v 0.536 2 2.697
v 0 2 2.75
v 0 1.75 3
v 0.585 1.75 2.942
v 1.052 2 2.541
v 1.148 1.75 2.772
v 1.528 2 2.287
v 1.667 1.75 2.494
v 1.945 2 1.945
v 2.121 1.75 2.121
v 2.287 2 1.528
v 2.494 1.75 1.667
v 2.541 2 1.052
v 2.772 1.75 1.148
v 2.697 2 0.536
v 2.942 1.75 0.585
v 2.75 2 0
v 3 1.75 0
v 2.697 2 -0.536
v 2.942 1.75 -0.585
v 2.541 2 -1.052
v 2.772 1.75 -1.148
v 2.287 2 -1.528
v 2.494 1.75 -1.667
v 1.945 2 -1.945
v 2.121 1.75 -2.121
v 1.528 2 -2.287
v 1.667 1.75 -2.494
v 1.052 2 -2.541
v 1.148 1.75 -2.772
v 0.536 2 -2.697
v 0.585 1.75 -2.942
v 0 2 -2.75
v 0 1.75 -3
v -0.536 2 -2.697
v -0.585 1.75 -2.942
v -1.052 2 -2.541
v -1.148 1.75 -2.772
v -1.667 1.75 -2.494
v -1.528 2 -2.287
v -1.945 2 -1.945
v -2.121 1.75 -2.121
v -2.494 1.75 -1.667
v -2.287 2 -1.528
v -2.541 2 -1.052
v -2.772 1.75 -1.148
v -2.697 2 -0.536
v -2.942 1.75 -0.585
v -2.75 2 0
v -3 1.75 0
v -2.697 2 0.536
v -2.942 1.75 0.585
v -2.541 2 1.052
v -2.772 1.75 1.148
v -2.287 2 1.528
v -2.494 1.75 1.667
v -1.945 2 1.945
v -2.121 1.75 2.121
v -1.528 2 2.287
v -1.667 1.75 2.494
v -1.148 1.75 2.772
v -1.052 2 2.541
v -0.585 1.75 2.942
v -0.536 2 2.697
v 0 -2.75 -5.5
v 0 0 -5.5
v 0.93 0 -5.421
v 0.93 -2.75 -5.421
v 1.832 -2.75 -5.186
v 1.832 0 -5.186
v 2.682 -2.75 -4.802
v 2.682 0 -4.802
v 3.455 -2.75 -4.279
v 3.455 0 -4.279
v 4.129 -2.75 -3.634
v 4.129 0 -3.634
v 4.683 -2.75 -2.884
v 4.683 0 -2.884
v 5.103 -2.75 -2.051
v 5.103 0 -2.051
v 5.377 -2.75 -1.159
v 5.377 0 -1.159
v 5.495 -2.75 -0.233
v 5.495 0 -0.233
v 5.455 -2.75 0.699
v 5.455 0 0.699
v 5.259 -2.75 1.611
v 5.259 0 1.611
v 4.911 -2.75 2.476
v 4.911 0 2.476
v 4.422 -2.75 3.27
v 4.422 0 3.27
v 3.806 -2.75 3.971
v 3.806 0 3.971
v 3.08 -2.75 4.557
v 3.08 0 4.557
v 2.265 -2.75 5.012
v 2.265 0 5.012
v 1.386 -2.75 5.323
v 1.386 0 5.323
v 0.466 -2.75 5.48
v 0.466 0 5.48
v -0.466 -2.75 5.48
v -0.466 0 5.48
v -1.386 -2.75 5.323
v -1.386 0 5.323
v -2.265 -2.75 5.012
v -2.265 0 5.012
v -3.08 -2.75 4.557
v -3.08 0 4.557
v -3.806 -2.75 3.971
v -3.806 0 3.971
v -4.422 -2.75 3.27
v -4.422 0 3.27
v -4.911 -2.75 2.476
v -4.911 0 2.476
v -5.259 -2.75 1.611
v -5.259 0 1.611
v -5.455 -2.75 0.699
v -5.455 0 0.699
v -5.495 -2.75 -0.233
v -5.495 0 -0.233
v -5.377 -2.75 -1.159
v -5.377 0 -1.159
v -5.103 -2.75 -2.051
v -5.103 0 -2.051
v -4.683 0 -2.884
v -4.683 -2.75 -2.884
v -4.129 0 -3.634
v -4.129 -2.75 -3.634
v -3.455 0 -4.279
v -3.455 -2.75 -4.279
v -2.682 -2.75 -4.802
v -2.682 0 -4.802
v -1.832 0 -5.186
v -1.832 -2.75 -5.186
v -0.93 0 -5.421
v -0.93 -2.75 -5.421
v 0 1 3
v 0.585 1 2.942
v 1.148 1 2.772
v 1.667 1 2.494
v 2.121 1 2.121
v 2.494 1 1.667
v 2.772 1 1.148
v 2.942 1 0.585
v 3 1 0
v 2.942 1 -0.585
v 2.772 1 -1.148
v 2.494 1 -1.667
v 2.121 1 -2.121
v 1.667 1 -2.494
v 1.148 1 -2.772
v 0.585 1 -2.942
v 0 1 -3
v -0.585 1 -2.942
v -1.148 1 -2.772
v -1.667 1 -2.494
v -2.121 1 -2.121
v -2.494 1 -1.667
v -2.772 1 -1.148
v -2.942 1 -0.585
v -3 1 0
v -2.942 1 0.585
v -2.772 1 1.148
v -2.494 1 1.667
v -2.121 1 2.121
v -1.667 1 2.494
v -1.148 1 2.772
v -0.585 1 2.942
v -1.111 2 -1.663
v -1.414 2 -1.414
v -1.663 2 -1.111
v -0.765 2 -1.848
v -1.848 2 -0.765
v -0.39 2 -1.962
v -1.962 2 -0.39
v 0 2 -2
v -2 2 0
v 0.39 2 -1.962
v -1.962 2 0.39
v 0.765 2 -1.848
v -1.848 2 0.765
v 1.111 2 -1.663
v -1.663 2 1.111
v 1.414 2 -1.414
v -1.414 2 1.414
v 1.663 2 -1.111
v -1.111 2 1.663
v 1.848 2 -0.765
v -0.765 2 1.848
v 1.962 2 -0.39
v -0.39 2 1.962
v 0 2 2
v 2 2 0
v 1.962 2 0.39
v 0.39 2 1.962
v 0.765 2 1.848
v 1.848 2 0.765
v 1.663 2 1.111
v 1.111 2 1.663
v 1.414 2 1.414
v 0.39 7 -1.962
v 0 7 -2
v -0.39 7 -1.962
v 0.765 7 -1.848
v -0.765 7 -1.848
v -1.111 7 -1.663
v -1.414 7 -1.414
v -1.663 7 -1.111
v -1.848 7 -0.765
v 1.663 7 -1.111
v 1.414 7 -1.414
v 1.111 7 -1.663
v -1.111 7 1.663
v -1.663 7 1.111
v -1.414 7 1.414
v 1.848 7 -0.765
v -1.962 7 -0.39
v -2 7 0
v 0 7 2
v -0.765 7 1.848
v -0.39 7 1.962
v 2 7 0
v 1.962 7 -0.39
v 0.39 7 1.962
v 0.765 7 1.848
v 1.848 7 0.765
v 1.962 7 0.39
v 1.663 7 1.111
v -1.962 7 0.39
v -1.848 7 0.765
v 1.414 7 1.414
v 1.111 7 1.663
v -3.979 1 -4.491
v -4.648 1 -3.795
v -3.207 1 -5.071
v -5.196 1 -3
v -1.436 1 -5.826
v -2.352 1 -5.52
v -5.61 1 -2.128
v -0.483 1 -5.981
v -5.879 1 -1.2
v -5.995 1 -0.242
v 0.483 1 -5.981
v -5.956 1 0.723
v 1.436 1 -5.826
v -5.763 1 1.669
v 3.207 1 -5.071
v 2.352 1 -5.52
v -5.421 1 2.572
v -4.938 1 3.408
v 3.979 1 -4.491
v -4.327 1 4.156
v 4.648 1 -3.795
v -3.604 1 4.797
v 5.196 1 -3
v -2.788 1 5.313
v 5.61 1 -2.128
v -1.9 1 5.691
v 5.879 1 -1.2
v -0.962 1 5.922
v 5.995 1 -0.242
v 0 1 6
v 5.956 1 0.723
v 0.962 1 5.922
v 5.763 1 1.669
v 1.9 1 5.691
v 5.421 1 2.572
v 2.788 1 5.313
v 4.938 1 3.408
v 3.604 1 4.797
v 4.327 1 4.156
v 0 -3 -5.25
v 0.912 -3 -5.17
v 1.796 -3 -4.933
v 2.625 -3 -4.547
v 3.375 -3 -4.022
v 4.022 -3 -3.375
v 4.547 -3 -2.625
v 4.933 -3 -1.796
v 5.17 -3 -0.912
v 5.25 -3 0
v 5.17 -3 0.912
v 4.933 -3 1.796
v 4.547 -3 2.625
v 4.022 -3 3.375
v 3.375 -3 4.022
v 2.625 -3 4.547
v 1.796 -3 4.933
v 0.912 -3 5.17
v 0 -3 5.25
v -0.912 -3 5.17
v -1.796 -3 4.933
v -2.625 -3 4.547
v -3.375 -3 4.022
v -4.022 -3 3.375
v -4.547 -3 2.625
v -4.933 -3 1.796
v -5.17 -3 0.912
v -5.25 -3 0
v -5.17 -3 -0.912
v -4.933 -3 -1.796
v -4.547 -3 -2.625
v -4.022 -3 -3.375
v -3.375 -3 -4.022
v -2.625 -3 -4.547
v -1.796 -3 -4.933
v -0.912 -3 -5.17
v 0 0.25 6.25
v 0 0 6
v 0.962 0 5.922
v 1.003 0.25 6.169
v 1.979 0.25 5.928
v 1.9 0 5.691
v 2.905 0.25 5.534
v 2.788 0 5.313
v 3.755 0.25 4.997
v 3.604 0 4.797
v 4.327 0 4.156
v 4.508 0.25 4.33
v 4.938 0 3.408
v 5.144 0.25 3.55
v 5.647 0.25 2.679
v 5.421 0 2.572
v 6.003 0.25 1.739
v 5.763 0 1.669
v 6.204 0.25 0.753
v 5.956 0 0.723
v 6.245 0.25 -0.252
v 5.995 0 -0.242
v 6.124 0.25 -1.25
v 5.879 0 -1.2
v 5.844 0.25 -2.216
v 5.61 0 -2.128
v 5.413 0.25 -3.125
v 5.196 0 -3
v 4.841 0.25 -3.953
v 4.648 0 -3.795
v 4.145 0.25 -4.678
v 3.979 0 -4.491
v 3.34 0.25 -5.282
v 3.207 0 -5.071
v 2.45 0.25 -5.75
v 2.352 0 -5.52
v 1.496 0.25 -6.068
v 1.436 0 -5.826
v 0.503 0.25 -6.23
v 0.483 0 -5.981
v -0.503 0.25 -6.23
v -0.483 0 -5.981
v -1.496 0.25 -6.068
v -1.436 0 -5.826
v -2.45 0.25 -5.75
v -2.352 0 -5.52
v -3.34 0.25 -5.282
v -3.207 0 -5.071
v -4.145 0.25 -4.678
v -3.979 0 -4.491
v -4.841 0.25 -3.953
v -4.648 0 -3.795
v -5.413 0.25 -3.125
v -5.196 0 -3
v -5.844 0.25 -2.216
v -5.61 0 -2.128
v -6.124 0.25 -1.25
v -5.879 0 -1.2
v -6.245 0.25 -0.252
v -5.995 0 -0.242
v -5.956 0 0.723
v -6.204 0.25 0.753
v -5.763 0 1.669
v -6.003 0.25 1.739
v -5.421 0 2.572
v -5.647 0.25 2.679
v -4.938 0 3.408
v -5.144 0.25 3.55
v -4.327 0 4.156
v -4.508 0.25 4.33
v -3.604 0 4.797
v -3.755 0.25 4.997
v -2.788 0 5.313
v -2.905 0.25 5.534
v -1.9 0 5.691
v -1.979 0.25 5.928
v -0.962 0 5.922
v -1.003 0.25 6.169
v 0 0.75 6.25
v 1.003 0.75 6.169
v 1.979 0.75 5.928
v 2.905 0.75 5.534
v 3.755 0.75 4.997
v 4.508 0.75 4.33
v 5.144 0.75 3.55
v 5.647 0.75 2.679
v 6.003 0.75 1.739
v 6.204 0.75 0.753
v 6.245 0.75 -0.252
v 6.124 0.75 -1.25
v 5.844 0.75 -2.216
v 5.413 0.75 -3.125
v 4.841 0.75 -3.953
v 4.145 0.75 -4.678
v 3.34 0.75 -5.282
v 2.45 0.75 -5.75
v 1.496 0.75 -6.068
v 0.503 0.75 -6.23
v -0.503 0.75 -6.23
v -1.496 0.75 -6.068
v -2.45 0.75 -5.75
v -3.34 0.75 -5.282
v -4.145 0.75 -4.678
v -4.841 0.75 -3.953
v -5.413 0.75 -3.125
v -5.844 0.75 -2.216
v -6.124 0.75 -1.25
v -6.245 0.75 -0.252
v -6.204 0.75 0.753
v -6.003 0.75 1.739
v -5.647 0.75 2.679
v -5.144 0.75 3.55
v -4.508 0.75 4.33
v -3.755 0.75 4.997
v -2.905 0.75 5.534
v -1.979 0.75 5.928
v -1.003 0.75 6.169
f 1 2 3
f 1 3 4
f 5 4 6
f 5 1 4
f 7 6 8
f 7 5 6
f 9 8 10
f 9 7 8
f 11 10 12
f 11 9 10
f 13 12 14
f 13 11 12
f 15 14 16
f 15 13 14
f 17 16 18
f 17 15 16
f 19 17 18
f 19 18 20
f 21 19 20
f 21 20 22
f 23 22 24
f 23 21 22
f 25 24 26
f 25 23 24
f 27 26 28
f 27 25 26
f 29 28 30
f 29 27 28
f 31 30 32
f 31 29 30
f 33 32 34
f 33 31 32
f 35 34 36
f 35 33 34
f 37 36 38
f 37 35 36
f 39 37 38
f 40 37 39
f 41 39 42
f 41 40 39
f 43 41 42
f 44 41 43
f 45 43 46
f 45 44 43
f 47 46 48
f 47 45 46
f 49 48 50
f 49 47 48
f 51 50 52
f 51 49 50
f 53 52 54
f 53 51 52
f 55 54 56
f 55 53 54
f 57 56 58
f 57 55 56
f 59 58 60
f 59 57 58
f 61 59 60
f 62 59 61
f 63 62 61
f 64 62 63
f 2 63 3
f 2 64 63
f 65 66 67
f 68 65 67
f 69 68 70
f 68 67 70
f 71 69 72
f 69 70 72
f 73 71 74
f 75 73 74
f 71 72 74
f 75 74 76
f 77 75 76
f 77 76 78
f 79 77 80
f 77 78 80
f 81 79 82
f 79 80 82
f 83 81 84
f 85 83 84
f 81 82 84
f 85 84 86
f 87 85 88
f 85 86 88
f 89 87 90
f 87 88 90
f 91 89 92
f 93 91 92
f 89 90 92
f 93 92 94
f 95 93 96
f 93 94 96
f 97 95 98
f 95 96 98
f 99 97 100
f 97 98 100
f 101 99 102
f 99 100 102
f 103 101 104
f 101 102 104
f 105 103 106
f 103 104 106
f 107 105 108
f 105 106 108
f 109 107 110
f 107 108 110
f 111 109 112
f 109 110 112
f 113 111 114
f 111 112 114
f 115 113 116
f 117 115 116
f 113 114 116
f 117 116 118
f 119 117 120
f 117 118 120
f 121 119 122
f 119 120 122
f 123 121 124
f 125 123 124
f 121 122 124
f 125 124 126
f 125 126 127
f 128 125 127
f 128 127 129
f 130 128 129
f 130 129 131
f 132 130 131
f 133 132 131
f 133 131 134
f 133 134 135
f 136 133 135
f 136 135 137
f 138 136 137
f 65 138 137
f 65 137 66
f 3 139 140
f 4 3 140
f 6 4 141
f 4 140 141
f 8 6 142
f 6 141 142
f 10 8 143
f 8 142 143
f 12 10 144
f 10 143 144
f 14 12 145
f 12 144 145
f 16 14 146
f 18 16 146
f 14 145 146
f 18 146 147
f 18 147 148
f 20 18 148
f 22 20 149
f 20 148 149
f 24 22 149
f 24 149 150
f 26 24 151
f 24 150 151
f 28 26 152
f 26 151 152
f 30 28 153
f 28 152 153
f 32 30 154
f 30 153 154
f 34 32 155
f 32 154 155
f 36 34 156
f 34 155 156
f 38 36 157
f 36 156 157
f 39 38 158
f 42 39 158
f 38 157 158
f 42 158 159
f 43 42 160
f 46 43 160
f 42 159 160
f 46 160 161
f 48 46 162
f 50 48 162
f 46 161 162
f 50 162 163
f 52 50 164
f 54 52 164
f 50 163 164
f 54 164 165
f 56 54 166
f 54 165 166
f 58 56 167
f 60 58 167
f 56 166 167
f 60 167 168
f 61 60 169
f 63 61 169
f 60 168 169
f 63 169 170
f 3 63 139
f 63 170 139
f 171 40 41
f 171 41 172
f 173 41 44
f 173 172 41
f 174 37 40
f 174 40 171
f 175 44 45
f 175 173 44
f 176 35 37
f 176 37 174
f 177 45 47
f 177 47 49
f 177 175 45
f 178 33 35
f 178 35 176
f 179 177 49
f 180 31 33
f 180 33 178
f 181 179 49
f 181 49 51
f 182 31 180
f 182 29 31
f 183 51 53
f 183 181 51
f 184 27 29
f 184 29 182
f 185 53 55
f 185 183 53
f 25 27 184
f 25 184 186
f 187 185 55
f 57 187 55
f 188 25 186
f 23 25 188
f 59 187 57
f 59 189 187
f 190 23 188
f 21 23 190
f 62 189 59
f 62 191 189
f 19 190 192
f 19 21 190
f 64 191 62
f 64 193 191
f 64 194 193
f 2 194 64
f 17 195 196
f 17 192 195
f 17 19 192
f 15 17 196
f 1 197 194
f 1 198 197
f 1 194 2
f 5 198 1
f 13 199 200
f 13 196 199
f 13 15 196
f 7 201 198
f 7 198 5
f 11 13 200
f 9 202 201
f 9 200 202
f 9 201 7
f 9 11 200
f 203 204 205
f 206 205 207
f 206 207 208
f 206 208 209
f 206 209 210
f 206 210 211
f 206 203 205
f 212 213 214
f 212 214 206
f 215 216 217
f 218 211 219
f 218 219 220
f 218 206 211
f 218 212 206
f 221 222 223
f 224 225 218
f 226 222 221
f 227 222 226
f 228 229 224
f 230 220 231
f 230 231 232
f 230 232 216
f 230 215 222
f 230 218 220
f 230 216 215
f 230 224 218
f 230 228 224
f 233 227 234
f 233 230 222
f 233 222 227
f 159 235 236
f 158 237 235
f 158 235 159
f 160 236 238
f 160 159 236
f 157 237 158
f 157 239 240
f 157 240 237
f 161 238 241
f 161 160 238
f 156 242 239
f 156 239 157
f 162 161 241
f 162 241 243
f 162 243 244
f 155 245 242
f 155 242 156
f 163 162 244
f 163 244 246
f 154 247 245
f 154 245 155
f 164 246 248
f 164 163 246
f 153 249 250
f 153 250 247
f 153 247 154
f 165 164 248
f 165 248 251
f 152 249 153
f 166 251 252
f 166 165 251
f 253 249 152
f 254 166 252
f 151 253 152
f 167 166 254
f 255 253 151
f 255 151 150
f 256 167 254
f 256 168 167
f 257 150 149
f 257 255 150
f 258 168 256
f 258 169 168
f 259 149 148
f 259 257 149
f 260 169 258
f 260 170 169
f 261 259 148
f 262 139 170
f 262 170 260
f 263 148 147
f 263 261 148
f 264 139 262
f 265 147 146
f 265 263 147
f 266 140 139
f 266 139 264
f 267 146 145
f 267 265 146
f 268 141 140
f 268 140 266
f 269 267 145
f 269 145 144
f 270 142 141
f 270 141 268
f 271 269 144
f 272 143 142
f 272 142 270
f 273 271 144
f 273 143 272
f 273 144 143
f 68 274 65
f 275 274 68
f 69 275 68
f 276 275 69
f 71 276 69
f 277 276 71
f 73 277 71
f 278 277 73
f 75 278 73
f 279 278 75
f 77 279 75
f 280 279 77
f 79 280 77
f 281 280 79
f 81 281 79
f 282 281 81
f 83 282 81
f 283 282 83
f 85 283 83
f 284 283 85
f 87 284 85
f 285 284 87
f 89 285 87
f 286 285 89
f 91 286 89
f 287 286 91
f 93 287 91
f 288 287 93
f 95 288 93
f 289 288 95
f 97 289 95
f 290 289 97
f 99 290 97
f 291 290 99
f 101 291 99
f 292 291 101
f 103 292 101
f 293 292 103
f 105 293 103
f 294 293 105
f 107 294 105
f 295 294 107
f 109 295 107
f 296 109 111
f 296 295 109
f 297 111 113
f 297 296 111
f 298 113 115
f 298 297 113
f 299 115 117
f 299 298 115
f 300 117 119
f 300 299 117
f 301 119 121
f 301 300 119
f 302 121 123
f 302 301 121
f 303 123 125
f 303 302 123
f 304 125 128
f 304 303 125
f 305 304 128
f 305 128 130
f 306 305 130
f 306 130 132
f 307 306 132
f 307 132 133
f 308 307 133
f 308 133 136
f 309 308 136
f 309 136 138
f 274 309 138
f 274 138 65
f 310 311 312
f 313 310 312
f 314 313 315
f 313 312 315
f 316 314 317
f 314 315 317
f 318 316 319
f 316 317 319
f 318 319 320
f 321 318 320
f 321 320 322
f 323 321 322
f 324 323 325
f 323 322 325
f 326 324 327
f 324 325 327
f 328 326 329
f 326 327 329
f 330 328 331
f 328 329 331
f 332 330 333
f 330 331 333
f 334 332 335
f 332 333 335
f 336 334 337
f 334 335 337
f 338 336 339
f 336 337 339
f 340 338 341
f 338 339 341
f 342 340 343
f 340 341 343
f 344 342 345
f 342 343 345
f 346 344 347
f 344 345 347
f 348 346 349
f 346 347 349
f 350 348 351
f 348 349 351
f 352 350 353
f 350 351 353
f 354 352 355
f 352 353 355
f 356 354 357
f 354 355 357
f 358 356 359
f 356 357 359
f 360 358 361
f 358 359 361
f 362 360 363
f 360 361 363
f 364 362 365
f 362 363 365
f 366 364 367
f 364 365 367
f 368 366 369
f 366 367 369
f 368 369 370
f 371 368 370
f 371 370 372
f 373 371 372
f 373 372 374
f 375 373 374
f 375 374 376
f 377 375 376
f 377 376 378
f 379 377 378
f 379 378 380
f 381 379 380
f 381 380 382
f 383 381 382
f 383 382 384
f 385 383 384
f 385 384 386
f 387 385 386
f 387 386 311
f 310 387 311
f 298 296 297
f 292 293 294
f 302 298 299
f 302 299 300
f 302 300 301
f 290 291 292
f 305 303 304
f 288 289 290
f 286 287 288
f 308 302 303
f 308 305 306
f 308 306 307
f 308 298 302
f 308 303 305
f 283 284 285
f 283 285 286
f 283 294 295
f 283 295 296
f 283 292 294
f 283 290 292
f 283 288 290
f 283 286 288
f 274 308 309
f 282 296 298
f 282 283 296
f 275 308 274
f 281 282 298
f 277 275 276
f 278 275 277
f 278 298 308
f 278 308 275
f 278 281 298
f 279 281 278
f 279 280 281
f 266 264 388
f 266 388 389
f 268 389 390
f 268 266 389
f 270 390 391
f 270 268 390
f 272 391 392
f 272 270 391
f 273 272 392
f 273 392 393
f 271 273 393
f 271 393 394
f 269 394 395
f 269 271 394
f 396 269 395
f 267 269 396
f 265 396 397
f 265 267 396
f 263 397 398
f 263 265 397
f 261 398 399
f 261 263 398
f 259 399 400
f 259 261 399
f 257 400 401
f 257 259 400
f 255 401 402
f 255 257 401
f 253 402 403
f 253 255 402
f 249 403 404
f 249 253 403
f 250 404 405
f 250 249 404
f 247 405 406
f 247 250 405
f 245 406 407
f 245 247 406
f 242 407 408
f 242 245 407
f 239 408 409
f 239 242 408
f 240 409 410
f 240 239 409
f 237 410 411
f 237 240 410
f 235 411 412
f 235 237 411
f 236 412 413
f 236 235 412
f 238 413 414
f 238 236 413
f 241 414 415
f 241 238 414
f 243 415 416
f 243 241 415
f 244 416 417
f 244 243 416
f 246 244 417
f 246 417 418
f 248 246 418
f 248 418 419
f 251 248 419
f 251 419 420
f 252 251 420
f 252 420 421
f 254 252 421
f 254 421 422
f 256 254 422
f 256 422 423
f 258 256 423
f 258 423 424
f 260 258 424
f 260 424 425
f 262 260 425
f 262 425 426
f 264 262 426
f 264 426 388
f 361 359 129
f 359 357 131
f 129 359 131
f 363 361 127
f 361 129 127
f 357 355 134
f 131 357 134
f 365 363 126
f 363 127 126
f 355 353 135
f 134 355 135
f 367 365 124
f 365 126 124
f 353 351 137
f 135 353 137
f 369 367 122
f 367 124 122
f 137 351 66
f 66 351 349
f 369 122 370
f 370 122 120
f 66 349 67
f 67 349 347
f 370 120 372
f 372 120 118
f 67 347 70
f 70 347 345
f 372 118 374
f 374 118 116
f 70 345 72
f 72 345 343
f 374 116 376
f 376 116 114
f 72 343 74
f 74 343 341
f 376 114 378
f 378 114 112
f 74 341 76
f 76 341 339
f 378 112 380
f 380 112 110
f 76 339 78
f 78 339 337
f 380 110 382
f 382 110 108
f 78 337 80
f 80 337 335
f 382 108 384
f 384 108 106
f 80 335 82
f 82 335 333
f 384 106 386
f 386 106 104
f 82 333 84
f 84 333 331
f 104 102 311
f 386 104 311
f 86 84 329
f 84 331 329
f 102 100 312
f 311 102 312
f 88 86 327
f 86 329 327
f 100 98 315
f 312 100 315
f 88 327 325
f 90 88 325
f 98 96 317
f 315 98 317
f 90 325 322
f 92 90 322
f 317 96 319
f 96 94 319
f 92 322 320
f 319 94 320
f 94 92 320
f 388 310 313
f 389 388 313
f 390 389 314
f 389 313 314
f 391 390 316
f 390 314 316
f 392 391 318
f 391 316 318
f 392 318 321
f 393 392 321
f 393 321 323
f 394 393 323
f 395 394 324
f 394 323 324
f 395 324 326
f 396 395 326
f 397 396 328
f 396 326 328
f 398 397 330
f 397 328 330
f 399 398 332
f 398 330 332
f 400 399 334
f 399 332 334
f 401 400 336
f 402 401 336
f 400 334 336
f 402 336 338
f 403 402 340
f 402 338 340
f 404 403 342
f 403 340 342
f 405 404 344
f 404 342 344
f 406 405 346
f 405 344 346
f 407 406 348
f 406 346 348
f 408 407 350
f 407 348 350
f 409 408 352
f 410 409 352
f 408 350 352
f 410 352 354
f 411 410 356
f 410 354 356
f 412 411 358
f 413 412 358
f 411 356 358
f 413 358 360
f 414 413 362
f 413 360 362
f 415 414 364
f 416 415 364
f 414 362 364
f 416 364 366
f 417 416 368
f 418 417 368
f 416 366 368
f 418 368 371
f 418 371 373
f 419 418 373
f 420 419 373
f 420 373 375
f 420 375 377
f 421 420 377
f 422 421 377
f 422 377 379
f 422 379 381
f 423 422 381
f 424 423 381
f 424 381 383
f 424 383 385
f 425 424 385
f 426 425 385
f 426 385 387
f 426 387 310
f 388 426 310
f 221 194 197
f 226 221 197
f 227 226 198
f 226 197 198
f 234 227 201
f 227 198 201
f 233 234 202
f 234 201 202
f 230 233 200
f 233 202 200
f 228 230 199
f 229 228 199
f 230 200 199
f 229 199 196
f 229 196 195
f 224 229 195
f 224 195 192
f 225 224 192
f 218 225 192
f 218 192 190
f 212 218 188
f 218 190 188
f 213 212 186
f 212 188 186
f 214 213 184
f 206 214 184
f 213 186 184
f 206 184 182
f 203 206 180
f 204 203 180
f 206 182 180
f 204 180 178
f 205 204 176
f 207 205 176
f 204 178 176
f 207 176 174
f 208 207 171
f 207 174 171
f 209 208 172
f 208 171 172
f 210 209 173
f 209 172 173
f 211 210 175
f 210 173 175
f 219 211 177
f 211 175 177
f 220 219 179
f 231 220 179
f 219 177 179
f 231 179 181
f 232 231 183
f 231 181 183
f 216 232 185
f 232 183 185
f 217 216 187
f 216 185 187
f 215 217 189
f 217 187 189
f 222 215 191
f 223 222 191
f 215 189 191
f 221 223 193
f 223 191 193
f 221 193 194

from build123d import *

# Parameters (mm, degrees)
SKETCH1_R           = 6.25
BOSS_EXTRUDE1_DEPTH = 1
SKETCH2_R           = 5.5
BOSS_EXTRUDE2_DEPTH = 3
SKETCH3_R           = 3
BOSS_EXTRUDE3_DEPTH = 1
SKETCH4_R           = 2
BOSS_EXTRUDE4_DEPTH = 5
CHAMFER1_SIZE       = 0.25
CHAMFER2_SIZE       = 0.25


with BuildPart() as part:
    # Sketch1 → Boss-Extrude1 (new body)
    with BuildSketch(Plane(origin=(0, 0, 0), x_dir=(1, 0, 0), z_dir=(0, 1, 0))):
        with Locations(Location((0, 0, 0), (0, 0, 270))):
            Circle(SKETCH1_R)
    extrude(amount=BOSS_EXTRUDE1_DEPTH)

    # Sketch2 → Boss-Extrude2 (add)
    with BuildSketch(Plane.XZ):
        with Locations(Location((0, 0, 0), (0, 0, 270))):
            Circle(SKETCH2_R)
    extrude(amount=BOSS_EXTRUDE2_DEPTH)

    # Sketch3 → Boss-Extrude3 (add)
    with BuildSketch(Plane(origin=(0, 1, 0), x_dir=(1, 0, 0), z_dir=(0, 1, 0))):
        with Locations(Location((0, 0, 0), (0, 0, 270))):
            Circle(SKETCH3_R)
    extrude(amount=BOSS_EXTRUDE3_DEPTH)

    # Sketch4 → Boss-Extrude4 (add)
    with BuildSketch(Plane(origin=(0, 2, 0), x_dir=(1, 0, 0), z_dir=(0, 1, 0))):
        with Locations(Location((0, 0, 0), (0, 0, 270))):
            Circle(SKETCH4_R)
    extrude(amount=BOSS_EXTRUDE4_DEPTH)

    # Chamfer1
    chamfer1_edges = [part.edges().sort_by_distance(p)[0] for p in [
        (0, 0, -6.25),
        (0, 1, -6.25),
        (0, -3, 5.5),
    ]]
    chamfer(chamfer1_edges, length=CHAMFER1_SIZE)

    # Chamfer2
    chamfer2_edges = [part.edges().sort_by_distance(p)[0] for p in [
        (0, 2, -3),
    ]]
    chamfer(chamfer2_edges, length=CHAMFER2_SIZE)


solid = part.part
